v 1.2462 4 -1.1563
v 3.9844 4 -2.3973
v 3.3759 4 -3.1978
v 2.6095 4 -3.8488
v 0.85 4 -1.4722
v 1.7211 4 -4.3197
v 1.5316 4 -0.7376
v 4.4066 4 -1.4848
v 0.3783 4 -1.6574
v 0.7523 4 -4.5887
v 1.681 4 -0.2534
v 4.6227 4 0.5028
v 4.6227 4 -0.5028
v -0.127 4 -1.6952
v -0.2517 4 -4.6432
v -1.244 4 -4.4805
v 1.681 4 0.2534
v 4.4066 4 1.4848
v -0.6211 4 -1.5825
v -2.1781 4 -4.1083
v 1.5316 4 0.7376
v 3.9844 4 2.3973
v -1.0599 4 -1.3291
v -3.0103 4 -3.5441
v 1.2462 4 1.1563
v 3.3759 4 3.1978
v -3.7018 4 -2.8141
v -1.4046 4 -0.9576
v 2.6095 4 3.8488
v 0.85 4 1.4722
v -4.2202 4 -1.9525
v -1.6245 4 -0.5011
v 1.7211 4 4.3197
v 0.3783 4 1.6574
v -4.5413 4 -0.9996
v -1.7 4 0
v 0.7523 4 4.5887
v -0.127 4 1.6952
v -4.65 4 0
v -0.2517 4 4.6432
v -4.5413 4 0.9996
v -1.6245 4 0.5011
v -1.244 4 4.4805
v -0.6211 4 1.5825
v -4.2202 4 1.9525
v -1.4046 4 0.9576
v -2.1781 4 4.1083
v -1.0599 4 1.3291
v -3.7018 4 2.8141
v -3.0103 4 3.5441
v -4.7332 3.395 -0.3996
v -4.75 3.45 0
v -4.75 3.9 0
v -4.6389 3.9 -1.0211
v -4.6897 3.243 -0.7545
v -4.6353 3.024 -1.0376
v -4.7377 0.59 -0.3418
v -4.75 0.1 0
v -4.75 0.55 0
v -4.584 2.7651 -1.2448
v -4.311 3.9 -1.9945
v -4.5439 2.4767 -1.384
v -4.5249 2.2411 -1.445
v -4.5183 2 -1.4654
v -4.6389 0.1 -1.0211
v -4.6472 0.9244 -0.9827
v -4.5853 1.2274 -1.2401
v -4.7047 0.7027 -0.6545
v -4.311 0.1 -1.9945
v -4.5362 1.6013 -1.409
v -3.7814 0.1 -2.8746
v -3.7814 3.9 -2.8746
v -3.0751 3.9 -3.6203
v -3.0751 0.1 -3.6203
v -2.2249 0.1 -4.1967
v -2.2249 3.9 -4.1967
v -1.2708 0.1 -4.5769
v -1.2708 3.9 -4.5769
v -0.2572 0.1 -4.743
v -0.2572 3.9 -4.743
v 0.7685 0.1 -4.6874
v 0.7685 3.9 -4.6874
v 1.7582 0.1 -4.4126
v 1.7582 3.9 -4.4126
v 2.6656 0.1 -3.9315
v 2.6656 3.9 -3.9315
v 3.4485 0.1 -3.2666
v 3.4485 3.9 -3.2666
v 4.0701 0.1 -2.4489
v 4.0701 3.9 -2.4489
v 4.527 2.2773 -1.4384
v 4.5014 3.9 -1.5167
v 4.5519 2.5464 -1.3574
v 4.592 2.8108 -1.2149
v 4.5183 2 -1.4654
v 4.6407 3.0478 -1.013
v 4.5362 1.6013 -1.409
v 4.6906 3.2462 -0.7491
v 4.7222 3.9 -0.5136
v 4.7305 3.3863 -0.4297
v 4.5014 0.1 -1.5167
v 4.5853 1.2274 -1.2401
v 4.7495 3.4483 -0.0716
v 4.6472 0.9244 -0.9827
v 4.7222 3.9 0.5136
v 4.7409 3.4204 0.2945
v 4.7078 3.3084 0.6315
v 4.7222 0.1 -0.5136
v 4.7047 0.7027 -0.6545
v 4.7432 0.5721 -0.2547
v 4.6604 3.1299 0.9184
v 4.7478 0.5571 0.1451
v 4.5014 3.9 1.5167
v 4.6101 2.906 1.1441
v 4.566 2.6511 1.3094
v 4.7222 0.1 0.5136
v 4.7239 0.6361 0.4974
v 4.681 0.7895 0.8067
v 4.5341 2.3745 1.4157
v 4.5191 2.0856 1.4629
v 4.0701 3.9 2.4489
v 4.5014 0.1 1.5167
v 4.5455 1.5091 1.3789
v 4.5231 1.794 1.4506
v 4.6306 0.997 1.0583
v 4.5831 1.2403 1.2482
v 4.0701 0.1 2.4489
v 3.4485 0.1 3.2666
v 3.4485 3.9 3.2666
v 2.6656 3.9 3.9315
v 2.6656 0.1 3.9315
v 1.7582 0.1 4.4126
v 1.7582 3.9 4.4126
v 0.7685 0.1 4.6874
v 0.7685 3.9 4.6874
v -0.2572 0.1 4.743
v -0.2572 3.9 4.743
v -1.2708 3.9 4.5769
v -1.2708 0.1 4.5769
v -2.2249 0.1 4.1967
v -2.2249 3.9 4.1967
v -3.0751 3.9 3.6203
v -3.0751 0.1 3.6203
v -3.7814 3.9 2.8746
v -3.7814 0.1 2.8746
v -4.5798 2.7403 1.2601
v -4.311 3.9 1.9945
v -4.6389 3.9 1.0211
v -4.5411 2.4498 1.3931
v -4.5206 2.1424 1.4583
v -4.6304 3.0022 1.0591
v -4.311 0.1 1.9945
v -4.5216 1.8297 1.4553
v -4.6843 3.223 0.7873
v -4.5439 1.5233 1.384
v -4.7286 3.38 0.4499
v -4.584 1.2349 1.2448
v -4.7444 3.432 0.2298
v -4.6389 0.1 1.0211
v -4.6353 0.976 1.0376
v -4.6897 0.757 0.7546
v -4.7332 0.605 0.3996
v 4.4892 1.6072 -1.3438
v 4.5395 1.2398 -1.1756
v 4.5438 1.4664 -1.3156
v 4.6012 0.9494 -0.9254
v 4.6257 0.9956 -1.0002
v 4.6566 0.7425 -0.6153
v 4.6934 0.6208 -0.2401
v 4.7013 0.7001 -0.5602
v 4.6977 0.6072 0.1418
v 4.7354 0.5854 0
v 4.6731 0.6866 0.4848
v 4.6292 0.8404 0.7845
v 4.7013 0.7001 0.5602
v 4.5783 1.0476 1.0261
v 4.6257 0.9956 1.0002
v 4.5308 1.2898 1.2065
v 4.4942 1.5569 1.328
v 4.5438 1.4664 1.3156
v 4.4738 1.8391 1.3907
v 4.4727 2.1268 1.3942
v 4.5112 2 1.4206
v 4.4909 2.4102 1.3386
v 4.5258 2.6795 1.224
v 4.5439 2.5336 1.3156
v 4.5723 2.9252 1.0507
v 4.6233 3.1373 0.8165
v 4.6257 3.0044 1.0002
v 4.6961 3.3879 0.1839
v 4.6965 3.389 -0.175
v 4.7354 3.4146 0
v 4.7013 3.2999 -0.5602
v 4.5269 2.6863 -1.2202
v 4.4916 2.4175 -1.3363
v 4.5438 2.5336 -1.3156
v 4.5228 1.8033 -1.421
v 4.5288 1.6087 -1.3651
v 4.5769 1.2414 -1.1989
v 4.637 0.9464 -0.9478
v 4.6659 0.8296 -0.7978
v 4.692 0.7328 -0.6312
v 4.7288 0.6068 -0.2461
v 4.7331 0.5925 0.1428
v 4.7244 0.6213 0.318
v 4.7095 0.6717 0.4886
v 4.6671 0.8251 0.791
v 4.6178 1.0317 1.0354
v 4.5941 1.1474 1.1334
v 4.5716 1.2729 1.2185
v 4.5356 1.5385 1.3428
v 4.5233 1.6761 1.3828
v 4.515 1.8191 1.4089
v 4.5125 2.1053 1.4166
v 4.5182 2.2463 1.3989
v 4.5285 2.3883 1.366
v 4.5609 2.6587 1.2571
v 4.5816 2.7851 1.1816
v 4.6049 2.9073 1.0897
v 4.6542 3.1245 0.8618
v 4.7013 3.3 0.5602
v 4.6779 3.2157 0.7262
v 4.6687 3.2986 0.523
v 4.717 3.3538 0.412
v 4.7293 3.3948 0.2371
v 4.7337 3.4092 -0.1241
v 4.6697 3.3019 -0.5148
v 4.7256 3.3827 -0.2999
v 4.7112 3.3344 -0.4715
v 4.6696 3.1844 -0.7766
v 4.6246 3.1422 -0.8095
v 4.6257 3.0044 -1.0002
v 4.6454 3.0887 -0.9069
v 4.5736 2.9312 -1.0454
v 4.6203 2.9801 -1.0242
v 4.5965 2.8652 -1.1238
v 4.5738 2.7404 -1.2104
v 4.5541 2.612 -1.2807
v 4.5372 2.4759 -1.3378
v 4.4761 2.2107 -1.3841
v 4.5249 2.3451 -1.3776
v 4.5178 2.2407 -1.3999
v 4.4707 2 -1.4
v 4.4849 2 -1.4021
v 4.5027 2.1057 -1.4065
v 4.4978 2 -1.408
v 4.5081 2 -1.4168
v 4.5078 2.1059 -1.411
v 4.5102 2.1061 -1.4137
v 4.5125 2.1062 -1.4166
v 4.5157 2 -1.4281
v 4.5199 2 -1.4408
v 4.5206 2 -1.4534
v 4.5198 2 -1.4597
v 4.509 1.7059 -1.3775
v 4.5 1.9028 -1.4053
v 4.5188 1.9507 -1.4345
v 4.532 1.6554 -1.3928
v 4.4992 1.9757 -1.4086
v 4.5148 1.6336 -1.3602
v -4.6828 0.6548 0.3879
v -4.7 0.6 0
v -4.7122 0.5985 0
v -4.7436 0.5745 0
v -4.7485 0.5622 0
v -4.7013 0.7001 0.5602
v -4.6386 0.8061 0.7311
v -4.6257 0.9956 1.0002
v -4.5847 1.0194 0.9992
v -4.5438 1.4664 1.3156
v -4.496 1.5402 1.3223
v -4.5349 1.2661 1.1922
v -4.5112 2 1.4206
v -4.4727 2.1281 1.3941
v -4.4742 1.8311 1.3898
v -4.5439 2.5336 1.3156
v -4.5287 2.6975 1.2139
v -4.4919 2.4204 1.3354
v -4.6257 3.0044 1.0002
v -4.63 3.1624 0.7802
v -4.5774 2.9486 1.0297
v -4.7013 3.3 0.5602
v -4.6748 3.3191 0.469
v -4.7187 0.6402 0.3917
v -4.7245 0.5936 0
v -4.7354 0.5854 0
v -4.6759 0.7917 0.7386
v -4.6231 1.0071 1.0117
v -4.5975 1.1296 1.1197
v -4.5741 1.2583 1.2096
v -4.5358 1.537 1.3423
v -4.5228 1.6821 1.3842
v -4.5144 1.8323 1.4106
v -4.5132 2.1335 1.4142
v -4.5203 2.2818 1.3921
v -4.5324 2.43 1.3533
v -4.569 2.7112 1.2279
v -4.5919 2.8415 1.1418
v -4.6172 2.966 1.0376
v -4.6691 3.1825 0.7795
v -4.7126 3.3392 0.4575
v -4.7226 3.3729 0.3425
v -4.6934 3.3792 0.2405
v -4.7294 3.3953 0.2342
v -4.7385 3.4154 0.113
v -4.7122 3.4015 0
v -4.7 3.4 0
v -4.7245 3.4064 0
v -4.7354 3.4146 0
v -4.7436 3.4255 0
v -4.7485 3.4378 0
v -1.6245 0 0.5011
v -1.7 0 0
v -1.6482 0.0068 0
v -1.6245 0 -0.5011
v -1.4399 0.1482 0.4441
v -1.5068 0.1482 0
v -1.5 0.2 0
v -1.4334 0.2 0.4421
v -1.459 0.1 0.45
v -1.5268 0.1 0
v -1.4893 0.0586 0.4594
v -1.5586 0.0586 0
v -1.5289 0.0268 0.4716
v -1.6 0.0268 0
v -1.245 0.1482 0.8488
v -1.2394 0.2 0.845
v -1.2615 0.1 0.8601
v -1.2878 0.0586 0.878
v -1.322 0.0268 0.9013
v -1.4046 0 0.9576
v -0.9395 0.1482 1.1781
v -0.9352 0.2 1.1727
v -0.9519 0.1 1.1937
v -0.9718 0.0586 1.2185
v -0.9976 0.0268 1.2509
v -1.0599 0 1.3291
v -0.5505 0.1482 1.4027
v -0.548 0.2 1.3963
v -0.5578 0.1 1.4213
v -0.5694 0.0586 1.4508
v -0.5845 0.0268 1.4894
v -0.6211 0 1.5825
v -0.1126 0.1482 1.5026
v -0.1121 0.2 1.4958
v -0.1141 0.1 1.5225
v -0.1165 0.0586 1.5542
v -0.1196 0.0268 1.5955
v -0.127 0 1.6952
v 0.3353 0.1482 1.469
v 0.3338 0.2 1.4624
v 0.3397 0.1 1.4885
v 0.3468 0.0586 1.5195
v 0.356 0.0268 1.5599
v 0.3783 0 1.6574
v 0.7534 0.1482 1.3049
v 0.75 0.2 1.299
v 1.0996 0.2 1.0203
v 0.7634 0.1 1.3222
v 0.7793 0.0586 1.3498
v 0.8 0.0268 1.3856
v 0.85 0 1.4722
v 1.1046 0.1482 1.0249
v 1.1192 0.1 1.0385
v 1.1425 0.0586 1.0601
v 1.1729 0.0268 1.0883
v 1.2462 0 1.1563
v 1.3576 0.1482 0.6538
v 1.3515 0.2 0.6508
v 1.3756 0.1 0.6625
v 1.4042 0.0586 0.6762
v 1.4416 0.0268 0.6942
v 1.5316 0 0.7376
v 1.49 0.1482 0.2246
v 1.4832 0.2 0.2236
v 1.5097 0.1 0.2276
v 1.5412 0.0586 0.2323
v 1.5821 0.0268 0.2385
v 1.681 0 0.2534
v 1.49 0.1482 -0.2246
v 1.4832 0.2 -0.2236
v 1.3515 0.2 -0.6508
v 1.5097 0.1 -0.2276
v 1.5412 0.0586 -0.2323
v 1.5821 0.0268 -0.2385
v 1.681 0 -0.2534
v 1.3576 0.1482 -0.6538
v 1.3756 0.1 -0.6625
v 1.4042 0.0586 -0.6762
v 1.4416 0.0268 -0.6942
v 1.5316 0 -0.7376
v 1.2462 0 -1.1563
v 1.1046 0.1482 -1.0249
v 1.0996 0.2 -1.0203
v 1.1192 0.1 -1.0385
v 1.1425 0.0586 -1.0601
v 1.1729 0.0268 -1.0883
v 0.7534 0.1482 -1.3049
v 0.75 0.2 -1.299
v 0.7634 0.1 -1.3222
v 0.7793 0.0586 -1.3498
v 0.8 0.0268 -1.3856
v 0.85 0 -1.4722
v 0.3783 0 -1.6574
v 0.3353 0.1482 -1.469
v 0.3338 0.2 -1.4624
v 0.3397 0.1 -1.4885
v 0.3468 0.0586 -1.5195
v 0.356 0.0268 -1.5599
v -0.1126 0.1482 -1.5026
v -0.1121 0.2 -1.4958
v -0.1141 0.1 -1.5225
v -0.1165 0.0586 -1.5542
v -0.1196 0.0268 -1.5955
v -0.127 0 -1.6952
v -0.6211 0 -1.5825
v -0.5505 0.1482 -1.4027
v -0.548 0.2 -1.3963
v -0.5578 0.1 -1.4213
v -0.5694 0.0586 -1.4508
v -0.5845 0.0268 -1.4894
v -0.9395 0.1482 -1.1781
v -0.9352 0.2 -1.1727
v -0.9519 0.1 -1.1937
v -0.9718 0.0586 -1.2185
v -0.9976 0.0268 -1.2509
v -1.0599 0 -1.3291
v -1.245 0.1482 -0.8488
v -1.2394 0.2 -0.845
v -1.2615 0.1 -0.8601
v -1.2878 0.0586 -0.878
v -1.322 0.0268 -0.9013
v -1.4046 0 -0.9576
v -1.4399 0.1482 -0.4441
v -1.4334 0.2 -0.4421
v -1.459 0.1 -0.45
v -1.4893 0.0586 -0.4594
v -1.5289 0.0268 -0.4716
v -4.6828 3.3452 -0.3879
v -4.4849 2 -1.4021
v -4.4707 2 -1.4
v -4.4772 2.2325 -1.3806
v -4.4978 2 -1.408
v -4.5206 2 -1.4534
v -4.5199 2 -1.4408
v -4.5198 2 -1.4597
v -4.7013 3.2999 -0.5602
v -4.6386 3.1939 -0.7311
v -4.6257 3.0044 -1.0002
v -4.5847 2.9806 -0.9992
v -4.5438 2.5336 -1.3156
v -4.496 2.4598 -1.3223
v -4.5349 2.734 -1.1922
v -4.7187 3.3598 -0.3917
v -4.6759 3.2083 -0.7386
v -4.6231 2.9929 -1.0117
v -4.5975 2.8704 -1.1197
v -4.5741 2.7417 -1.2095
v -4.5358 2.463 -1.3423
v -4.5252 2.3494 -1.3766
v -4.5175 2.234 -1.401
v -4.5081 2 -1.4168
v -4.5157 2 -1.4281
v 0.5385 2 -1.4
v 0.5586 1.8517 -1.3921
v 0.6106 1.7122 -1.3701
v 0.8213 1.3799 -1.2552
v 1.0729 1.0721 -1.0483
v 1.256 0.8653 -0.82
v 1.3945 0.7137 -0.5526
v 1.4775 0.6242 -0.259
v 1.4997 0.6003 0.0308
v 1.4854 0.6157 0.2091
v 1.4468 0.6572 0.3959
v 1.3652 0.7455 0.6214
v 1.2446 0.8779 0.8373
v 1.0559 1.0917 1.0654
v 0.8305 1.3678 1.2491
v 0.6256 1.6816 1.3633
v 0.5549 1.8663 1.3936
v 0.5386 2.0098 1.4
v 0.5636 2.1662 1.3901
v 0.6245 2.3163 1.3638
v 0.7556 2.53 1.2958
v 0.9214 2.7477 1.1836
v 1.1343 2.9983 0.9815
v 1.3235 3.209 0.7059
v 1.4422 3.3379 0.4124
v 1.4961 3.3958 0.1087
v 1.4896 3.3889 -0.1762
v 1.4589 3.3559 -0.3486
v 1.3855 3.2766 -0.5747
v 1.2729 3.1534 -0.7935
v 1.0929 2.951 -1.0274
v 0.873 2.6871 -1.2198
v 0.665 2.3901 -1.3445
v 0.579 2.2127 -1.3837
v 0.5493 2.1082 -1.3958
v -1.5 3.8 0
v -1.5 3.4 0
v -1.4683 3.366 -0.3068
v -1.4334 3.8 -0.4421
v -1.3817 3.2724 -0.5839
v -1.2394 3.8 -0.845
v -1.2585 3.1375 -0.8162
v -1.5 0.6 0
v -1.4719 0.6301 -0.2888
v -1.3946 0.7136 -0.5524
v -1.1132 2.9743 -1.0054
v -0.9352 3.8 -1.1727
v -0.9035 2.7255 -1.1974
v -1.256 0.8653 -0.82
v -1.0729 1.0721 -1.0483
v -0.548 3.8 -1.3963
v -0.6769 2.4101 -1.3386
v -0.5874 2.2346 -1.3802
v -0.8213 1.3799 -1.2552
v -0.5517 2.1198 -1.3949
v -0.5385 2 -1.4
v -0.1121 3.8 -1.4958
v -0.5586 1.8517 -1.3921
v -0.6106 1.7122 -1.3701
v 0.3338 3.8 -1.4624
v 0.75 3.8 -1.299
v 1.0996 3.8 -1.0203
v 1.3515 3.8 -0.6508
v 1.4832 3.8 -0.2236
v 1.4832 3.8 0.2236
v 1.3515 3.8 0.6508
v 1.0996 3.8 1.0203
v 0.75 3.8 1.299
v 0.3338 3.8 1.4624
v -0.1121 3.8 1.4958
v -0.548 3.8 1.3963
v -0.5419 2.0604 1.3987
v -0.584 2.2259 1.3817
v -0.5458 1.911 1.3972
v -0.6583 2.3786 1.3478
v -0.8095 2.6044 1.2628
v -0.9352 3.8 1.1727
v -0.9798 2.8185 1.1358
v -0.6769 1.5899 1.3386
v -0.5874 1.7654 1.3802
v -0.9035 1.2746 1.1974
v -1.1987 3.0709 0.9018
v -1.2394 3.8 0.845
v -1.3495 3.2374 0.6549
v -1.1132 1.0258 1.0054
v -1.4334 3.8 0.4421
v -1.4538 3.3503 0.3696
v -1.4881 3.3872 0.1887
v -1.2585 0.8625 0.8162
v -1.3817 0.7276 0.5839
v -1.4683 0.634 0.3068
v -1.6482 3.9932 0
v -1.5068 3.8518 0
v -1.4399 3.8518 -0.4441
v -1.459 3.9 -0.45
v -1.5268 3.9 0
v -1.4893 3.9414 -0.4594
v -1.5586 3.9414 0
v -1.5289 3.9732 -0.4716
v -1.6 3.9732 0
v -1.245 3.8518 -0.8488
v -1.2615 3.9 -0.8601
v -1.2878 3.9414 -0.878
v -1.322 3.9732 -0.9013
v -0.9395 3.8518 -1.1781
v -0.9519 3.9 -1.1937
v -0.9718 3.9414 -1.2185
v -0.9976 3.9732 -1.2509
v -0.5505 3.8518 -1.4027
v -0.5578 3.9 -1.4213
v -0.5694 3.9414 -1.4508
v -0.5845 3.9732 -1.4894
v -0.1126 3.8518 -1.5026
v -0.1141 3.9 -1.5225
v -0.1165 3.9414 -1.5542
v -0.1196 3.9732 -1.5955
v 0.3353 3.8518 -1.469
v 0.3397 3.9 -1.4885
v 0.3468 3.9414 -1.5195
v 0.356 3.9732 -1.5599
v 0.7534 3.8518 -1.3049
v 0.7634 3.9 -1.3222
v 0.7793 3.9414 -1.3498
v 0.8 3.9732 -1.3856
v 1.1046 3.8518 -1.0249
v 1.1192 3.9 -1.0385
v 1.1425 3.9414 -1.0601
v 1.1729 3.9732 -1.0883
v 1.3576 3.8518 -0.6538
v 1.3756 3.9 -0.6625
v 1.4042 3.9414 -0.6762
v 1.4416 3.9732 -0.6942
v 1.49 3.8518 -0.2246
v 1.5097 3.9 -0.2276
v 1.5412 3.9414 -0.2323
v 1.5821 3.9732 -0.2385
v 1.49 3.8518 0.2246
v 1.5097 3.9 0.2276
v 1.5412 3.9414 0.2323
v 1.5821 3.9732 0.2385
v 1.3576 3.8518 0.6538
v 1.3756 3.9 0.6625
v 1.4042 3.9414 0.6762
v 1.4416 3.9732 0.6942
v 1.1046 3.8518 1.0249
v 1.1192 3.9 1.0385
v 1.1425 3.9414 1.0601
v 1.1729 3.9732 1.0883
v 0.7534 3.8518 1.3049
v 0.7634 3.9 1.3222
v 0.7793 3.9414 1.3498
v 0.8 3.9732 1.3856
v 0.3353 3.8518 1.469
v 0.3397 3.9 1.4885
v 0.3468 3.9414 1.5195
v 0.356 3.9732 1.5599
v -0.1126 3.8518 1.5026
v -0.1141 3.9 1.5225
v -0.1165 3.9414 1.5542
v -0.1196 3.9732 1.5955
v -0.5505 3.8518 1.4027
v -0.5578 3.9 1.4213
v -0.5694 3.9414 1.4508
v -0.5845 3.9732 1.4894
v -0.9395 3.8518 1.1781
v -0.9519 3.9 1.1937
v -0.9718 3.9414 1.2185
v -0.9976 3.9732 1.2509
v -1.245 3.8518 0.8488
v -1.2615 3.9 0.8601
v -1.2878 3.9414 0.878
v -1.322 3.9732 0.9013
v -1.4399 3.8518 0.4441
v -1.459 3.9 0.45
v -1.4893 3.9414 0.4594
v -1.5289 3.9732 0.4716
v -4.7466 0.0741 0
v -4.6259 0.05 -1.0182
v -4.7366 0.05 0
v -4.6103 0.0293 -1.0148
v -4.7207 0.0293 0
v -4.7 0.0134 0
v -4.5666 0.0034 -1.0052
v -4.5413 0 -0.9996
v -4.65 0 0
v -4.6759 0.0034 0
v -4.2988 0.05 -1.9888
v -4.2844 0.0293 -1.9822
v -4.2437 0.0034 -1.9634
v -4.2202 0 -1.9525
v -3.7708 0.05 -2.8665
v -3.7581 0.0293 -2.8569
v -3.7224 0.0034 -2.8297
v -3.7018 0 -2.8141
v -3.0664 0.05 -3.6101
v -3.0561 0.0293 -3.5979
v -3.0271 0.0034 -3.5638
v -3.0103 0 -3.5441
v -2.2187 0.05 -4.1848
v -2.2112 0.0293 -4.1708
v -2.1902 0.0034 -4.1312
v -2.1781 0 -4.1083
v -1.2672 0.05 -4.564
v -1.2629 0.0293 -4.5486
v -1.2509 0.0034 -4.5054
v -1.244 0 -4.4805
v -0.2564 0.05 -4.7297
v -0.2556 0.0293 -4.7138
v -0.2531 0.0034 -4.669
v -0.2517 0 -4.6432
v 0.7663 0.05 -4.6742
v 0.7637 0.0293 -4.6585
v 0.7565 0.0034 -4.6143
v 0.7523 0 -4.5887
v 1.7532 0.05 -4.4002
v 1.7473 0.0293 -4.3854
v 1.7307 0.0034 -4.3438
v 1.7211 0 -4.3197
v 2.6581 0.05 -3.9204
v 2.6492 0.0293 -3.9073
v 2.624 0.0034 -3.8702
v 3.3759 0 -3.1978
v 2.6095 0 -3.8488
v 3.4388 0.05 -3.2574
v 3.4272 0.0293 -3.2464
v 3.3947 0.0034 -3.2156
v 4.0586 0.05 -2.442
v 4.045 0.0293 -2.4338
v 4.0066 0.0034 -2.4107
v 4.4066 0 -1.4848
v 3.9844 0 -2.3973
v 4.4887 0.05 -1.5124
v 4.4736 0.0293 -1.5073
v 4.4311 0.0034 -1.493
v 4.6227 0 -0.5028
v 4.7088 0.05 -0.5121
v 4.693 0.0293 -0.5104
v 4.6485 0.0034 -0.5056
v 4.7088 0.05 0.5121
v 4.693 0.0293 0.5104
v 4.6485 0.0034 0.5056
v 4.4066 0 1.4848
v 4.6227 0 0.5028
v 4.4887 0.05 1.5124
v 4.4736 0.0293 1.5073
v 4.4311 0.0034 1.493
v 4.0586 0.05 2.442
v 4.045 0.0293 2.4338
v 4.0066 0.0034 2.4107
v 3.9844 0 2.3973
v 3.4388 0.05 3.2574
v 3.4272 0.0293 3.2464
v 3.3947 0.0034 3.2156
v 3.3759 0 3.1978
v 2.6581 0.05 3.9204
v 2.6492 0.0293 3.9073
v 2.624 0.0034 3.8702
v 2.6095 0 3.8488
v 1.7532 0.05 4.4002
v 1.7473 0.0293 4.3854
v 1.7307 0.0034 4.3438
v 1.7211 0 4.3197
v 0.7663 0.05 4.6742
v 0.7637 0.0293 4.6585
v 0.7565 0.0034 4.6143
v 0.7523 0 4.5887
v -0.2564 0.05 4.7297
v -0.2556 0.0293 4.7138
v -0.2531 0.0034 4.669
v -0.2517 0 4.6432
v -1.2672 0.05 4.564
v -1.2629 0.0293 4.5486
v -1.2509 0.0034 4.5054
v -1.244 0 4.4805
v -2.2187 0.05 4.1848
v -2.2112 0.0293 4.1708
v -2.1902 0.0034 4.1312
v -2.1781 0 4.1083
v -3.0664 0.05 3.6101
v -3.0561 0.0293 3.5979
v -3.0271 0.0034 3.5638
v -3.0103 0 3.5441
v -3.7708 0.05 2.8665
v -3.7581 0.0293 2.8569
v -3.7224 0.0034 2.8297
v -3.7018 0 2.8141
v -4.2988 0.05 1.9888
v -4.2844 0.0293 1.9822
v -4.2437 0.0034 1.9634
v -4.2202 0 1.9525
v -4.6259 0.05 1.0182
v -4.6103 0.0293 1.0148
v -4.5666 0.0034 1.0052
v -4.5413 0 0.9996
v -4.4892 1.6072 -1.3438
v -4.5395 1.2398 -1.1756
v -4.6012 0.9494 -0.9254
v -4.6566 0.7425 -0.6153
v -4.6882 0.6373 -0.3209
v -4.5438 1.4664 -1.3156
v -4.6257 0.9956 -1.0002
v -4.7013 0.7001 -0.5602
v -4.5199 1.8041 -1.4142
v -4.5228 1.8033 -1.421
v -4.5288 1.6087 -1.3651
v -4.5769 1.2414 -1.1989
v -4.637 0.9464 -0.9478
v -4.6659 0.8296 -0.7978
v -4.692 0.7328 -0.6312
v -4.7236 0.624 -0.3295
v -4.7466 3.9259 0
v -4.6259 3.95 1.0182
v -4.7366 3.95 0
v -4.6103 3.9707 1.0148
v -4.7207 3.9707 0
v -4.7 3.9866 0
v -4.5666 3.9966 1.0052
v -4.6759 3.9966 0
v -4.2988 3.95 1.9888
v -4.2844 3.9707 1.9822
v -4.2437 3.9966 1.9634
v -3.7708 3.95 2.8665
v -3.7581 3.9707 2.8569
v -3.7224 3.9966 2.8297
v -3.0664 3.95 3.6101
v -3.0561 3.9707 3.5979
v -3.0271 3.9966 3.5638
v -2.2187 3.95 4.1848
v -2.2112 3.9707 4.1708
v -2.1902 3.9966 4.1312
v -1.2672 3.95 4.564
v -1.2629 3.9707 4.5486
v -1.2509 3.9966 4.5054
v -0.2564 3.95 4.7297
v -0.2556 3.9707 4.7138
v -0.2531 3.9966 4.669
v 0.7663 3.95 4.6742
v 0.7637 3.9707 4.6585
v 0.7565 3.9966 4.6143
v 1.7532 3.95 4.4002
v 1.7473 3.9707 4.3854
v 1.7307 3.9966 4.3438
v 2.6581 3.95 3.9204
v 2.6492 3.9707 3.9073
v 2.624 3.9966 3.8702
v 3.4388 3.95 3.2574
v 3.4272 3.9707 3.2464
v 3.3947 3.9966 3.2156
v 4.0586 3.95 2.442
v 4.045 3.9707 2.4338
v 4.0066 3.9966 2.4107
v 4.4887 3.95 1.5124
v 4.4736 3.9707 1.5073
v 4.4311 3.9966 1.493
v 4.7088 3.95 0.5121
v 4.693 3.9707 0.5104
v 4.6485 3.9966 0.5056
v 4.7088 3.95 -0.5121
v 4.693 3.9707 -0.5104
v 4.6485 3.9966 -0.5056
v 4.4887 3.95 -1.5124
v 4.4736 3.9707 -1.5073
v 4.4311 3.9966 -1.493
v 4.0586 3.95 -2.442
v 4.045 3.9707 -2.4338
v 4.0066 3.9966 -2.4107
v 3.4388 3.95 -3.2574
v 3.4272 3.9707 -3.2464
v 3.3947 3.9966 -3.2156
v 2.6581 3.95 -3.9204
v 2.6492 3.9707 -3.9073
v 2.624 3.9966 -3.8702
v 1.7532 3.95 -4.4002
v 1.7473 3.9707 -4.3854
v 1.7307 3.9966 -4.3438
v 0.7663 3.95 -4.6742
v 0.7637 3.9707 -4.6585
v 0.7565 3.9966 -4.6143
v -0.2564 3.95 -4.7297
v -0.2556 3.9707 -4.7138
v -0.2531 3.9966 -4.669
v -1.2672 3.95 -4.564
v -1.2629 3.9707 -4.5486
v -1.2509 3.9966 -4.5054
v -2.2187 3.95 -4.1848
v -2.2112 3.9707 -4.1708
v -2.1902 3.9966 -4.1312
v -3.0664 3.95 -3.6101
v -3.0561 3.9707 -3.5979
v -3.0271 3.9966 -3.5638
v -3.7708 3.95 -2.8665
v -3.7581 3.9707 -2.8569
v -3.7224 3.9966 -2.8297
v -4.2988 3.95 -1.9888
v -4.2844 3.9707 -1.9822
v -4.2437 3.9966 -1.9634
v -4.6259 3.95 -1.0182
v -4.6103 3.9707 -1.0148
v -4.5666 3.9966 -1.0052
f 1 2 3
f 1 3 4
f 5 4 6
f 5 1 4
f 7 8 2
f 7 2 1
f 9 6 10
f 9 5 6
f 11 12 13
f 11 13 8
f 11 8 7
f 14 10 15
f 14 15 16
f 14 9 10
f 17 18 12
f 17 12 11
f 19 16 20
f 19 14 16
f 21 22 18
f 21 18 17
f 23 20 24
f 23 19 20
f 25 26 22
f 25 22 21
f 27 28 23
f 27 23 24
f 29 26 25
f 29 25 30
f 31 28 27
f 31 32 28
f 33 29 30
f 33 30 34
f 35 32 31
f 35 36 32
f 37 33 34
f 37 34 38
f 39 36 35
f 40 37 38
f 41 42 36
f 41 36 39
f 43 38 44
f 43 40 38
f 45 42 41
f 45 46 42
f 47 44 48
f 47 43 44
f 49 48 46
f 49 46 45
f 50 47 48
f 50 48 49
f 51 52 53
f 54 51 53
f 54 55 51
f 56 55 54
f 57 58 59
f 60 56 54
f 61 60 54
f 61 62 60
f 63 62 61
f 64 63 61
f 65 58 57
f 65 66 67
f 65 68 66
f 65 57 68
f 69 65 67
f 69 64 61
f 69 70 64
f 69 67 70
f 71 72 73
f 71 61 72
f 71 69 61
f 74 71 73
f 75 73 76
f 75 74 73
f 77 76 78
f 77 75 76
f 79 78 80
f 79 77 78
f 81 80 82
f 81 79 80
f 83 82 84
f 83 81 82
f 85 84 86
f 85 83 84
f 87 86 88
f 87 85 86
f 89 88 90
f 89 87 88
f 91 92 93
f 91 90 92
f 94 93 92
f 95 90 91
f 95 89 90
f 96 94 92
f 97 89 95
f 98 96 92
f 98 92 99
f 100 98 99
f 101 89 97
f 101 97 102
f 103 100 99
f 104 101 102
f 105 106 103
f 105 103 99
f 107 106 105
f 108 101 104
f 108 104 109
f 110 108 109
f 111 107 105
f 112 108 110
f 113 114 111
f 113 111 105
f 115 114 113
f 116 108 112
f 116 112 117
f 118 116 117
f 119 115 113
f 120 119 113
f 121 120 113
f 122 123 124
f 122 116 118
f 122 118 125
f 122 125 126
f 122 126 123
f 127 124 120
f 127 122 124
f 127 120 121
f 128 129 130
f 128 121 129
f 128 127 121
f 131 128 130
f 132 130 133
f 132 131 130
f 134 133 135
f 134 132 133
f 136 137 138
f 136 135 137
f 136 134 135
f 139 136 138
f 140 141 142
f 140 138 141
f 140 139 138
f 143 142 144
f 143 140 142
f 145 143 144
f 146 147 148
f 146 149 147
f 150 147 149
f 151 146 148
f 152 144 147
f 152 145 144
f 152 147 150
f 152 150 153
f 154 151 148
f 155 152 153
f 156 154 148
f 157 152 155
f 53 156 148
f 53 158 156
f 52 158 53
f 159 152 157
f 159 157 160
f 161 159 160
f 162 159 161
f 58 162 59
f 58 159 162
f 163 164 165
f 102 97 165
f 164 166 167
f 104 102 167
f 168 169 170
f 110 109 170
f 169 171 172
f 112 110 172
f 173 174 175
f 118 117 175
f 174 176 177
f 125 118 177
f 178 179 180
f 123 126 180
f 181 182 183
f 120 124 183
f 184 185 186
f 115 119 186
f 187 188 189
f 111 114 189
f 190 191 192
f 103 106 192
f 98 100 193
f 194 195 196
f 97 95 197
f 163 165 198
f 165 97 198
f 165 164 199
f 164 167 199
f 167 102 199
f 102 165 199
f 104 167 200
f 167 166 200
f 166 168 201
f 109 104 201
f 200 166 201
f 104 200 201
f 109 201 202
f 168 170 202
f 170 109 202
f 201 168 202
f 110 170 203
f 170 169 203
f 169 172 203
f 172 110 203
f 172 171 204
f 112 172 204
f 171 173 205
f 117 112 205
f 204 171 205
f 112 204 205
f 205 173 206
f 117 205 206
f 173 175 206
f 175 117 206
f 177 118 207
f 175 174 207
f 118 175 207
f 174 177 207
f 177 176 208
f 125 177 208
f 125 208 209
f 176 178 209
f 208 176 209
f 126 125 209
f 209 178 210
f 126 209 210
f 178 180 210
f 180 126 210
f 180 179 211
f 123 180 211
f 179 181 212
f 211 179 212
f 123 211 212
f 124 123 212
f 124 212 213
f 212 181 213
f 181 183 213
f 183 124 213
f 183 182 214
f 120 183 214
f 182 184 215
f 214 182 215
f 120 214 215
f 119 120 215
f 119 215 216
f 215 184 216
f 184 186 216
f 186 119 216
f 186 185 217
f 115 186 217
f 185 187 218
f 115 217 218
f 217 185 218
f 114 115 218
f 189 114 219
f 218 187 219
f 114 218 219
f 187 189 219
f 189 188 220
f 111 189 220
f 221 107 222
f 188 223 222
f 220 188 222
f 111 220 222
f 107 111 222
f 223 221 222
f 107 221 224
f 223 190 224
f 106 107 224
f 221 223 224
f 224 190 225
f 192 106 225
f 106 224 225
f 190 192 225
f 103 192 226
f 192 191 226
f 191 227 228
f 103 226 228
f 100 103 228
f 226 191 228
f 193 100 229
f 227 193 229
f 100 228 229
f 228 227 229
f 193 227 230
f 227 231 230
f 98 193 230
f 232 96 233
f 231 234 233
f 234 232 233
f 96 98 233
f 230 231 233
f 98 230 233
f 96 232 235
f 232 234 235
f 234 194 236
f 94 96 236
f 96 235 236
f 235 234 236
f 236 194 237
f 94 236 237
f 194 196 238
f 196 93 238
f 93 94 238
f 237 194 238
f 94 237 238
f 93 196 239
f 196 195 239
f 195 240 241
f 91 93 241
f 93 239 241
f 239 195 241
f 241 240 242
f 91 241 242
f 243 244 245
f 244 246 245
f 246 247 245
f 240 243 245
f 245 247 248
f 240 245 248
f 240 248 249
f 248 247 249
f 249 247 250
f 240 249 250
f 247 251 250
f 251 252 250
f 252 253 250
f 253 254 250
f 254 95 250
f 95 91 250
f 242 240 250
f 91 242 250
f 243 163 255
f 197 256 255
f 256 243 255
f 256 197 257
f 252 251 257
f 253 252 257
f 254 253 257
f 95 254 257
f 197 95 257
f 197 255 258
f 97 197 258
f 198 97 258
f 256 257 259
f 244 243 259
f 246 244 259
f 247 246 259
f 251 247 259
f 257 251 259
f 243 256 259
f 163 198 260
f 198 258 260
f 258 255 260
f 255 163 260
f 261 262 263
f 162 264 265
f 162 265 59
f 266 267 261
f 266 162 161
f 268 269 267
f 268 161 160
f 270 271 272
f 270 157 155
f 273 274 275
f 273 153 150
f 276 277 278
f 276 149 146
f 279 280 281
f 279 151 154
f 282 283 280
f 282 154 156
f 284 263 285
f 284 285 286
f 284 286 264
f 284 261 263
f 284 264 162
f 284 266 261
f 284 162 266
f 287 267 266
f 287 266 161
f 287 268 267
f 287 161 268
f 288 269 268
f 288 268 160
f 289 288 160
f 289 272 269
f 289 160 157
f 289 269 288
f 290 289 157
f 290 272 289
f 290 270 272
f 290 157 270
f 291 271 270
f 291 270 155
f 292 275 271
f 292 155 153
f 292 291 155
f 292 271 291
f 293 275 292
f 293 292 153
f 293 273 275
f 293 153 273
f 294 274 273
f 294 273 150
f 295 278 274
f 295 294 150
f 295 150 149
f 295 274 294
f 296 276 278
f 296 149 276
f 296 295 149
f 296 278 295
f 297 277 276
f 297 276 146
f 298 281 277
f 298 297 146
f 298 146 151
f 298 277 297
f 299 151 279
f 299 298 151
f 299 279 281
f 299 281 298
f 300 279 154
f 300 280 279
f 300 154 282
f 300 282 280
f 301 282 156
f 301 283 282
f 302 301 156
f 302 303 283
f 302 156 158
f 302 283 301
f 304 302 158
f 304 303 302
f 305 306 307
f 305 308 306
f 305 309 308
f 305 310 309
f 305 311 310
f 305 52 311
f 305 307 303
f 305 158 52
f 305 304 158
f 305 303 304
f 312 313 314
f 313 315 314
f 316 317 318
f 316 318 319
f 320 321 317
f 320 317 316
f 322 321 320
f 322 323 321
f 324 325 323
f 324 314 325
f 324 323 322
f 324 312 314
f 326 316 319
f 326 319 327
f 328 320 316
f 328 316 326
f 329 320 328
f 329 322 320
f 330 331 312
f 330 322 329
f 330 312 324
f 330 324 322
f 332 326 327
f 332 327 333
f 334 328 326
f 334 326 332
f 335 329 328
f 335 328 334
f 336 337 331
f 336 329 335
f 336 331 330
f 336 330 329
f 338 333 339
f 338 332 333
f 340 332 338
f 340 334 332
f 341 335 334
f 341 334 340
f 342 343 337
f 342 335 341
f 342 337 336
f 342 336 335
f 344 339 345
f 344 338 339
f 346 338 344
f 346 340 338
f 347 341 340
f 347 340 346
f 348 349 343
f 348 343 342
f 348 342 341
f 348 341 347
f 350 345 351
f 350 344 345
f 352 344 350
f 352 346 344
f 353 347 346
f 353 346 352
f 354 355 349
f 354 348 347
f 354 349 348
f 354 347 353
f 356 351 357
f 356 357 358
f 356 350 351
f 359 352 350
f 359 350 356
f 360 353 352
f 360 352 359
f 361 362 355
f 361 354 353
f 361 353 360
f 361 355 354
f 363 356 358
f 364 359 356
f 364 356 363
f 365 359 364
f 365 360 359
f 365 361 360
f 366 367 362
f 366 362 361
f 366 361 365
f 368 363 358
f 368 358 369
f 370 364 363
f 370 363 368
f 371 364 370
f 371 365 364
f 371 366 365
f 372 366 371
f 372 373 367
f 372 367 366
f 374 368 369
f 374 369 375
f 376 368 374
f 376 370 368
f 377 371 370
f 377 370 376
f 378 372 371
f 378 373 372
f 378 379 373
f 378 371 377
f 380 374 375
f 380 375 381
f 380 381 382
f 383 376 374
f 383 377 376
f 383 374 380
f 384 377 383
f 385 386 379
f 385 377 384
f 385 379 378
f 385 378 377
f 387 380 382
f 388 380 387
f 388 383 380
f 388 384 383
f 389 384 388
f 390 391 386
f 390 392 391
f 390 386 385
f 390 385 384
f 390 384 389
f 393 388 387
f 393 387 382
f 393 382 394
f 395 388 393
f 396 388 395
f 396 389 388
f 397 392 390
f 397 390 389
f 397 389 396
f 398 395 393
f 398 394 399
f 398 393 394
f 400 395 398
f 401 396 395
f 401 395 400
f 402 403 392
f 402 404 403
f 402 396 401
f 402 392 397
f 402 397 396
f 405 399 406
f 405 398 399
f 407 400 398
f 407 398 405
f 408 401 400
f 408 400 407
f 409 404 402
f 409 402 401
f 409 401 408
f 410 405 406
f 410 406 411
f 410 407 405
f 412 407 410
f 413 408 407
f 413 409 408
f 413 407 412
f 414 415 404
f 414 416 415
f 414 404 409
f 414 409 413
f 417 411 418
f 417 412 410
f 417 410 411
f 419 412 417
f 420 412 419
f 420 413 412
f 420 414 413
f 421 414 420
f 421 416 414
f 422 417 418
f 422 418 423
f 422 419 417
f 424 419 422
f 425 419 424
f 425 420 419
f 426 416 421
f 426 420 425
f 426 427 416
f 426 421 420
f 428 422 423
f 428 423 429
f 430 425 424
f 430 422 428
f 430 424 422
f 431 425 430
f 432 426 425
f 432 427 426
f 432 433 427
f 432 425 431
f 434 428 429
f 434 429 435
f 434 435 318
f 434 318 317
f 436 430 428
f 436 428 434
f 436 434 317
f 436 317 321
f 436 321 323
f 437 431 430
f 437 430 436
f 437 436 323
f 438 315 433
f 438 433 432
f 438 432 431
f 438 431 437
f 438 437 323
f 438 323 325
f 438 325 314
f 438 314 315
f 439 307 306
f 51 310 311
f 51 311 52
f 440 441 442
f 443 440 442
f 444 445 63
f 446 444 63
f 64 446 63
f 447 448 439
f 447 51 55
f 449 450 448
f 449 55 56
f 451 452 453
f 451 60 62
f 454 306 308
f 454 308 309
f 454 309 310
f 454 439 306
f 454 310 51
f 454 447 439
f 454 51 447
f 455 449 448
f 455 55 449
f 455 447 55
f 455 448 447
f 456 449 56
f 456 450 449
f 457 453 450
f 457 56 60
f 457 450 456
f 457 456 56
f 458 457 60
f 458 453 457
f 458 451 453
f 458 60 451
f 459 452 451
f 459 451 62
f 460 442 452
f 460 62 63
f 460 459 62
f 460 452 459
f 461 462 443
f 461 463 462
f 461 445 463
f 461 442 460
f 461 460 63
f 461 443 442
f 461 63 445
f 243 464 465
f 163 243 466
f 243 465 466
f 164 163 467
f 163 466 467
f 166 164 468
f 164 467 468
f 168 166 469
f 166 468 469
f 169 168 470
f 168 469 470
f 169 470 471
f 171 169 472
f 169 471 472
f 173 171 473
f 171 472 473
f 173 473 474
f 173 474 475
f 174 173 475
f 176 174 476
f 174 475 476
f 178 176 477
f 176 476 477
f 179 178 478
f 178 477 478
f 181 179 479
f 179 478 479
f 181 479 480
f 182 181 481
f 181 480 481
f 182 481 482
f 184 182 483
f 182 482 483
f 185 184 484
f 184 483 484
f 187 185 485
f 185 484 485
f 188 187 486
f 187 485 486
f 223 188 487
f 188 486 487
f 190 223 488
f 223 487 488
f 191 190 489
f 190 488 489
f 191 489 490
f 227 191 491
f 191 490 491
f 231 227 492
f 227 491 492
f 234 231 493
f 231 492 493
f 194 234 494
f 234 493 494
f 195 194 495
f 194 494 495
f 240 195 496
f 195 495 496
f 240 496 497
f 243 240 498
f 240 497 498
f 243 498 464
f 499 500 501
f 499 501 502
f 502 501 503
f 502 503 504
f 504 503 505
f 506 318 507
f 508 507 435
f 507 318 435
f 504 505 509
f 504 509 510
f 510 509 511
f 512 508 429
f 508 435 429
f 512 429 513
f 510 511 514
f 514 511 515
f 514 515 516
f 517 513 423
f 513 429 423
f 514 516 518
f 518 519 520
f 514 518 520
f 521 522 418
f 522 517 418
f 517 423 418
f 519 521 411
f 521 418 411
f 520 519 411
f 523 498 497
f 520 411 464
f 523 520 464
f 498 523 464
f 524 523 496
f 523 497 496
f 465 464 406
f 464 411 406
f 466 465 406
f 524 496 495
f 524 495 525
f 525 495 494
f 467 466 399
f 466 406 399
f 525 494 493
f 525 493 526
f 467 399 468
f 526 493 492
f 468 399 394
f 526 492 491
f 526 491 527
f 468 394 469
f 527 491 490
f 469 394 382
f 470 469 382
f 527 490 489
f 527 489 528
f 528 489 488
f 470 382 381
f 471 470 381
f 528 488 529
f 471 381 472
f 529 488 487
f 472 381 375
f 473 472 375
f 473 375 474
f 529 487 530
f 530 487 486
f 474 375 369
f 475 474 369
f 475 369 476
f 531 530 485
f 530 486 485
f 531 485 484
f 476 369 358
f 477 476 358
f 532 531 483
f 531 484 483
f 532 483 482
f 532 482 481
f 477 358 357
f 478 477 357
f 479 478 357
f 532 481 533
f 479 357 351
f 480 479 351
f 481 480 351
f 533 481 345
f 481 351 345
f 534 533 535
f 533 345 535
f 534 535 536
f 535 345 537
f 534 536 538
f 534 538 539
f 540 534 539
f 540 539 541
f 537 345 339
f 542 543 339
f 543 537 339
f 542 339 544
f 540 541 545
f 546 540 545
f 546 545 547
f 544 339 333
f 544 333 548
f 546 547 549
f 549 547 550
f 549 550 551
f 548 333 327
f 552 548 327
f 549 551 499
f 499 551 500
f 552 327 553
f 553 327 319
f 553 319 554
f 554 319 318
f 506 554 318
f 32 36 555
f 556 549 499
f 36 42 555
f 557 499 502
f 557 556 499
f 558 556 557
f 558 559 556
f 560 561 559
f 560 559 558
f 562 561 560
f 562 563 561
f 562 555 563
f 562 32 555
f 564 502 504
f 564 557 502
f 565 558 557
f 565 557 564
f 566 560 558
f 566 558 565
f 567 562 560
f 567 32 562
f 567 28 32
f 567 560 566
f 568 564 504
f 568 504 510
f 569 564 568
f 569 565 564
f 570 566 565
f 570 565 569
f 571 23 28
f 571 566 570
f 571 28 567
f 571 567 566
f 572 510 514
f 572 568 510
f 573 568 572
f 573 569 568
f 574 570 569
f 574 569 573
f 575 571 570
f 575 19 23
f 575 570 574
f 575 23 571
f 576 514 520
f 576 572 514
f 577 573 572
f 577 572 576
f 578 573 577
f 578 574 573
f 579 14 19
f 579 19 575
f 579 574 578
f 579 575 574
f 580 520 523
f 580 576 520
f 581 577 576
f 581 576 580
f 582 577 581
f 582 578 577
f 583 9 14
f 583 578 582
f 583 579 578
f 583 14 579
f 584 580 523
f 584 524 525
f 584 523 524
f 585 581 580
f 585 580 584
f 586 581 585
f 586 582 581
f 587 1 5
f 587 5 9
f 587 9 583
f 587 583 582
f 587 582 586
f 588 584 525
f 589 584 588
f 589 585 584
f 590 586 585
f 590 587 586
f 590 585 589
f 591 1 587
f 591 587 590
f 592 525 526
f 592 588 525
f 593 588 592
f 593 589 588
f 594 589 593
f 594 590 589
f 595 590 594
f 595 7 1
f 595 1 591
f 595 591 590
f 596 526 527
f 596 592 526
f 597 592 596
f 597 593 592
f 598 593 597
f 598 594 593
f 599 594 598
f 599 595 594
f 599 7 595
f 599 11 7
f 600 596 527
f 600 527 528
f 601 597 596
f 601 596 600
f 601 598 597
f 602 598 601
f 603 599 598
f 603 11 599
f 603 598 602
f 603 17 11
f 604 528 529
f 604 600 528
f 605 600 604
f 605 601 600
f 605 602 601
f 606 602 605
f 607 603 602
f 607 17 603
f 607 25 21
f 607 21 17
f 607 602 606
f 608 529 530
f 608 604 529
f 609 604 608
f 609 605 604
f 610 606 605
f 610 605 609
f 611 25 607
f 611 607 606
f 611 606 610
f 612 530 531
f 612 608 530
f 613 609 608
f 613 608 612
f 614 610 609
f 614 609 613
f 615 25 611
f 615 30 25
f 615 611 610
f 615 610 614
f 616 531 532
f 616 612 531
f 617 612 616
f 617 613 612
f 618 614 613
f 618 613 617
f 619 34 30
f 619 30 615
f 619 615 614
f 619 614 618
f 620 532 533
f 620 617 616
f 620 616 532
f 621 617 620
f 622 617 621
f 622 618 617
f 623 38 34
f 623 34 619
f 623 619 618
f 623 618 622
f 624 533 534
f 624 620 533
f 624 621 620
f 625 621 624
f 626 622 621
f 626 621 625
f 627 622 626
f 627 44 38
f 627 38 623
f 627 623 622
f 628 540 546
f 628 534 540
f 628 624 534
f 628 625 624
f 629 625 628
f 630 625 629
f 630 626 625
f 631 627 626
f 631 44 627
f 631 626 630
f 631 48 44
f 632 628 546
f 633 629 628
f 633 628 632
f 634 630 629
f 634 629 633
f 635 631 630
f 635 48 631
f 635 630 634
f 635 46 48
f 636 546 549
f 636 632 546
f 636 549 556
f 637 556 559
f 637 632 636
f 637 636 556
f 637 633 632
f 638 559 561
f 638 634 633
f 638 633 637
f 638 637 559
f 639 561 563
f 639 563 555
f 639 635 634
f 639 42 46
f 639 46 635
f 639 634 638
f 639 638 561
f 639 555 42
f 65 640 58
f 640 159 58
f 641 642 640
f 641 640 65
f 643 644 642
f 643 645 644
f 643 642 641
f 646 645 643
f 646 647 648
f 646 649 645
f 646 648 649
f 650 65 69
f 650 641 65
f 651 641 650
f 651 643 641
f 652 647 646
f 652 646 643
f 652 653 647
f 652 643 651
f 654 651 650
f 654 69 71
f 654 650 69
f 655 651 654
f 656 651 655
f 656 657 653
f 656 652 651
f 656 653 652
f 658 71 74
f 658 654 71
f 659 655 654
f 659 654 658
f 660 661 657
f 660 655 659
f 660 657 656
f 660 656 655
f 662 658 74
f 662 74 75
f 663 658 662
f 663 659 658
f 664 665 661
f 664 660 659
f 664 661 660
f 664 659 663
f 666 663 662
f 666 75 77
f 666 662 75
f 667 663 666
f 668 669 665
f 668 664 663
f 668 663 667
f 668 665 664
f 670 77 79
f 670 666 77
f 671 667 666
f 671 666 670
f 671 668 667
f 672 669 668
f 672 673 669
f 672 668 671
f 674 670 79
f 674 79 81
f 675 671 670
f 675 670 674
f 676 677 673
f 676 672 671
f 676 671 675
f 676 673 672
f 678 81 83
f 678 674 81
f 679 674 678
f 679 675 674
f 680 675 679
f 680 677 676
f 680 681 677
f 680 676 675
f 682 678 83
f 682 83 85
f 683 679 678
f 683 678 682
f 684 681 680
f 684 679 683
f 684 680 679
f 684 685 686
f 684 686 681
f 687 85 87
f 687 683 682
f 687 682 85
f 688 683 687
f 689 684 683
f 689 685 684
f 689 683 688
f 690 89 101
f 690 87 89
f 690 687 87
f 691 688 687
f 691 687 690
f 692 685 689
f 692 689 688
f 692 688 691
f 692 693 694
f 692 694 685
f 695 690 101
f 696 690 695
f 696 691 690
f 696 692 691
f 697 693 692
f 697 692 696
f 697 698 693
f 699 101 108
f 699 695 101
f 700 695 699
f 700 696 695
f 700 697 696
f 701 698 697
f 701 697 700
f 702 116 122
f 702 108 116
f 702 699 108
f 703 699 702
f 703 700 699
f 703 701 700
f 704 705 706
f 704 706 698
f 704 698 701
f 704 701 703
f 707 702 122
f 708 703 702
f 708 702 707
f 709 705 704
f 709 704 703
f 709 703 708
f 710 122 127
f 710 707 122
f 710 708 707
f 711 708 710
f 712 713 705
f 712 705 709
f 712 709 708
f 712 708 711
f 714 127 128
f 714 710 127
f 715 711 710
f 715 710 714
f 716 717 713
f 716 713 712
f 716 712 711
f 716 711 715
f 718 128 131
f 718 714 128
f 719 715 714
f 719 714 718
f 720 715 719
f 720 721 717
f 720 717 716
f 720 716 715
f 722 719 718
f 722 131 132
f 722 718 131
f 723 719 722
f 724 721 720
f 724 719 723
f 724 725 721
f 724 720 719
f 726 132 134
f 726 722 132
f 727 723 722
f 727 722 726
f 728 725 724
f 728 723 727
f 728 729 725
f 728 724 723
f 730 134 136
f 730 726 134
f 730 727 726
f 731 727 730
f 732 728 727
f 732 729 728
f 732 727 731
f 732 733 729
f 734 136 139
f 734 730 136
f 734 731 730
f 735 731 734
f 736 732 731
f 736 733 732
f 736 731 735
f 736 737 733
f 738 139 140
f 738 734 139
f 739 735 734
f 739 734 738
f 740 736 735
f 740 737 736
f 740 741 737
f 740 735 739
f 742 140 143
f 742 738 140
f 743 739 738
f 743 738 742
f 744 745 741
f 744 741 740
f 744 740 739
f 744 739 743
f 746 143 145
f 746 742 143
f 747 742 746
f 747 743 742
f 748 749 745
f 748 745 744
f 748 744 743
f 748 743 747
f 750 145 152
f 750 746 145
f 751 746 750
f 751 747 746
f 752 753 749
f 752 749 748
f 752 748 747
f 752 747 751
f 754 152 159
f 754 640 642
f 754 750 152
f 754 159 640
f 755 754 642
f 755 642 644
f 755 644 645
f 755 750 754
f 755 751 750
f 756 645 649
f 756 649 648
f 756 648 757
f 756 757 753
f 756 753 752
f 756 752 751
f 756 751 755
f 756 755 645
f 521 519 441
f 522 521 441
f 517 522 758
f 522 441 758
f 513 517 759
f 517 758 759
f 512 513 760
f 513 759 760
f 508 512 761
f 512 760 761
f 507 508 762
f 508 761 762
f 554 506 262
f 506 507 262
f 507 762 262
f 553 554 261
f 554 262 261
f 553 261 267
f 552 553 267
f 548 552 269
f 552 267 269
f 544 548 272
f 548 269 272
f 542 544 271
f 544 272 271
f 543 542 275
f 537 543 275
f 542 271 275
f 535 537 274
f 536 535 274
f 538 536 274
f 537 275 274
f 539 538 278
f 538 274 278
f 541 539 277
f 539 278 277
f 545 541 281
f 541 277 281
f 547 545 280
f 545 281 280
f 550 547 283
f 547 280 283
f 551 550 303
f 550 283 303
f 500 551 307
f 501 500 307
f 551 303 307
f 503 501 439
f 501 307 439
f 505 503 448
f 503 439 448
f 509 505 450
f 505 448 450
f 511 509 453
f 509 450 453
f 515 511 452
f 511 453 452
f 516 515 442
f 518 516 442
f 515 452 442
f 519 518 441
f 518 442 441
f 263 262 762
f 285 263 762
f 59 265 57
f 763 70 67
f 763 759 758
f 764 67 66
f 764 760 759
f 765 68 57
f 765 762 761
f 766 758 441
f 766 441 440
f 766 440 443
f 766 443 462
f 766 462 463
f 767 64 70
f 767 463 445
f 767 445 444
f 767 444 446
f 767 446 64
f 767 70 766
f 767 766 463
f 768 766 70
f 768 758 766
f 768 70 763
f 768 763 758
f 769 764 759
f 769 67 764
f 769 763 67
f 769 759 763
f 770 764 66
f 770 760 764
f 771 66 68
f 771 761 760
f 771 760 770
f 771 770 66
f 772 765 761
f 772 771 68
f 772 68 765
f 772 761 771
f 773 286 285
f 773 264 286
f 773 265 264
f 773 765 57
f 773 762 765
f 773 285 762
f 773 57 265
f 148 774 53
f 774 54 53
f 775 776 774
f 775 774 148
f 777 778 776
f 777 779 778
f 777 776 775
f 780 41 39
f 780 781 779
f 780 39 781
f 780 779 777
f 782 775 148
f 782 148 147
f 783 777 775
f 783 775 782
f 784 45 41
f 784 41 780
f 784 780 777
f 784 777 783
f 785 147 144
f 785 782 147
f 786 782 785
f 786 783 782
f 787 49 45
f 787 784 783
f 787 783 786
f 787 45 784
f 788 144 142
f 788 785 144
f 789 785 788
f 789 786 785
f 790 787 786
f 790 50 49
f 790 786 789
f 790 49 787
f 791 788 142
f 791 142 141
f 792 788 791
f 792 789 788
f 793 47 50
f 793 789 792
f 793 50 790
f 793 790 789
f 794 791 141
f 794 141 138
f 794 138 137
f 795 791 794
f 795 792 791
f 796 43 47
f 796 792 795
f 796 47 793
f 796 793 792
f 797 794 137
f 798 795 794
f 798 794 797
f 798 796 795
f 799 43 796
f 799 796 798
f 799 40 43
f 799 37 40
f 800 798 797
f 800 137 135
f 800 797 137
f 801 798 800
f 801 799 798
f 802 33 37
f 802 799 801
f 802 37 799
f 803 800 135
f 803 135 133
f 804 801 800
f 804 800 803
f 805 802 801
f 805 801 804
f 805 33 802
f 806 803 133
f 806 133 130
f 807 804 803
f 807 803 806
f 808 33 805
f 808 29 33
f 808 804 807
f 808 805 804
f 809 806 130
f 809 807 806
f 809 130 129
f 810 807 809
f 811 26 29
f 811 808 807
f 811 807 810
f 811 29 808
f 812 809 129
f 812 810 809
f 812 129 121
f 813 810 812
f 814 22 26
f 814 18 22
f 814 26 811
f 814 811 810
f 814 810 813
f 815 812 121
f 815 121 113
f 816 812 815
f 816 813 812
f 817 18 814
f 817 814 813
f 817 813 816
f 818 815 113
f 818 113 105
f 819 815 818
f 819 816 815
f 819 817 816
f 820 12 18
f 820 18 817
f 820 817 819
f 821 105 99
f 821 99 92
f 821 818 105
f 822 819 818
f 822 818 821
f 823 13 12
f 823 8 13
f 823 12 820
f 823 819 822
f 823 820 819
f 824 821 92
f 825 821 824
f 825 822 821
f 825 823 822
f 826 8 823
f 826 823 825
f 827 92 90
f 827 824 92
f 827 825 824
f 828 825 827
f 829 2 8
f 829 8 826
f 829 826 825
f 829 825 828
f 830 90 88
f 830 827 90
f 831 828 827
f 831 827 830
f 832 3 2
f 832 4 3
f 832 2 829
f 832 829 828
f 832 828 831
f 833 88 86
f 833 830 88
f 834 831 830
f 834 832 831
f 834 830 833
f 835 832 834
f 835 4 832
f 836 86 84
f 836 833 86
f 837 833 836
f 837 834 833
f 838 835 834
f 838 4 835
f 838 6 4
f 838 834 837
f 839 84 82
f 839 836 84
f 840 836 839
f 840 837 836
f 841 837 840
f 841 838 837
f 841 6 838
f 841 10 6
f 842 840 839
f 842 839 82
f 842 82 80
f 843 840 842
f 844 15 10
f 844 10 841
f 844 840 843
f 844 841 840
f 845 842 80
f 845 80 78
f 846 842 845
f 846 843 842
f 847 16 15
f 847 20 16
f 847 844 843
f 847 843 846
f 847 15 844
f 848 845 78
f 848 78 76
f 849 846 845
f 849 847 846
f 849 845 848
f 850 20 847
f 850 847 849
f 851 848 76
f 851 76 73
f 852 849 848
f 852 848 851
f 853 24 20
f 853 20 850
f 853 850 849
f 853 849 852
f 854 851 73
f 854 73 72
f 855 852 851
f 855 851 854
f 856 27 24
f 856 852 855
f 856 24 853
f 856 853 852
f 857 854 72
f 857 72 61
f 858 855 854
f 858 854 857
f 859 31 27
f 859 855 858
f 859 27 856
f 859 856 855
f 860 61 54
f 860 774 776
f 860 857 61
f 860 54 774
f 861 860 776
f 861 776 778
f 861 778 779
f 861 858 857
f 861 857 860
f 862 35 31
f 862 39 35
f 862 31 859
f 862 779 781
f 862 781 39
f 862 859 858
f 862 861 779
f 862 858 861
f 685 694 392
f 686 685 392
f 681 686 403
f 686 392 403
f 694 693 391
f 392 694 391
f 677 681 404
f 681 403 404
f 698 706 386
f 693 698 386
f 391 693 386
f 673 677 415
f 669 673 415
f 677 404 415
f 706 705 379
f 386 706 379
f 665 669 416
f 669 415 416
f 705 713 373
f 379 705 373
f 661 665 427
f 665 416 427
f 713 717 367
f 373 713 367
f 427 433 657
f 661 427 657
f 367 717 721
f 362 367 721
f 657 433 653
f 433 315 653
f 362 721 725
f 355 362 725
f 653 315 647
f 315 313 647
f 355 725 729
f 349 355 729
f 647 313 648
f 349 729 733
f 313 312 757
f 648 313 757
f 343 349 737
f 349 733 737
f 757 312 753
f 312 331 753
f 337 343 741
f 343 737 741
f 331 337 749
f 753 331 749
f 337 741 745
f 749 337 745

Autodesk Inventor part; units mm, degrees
ref_plane "XZ Plane" through (0, 0, 0) normal (0, 1, 0) x (-1, 0, 0)
ref_plane "XY Plane" through (0, 0, 0) normal (0, 0, 1) x (1, 0, 0)
sketch "Szkic1" plane through (0, 0, 0) normal (0, 1, 0) x (-1, 0, 0)
  circle A0 centre (0, 0) radius 4.75
  circle A1 centre (0, 0) radius 1.5
  dimension "d0" = 9.5
  dimension "d1" = 3
extrude "Wyciągnięcie proste1" add sketch "Szkic1" along normal blind 4
ref_plane "Płaszczyzna konstrukcyjna1" through (4.75, 0, 0) normal (1, 0, 0) x (0, 1, 0)
sketch "Szkic2" plane through (4.75, 0, 0) normal (1, 0, 0) x (0, 1, 0)
  line L0 (-0.6, 0) -> (3.6, 0) projected
  line L1 (4, -4.75) -> (4, 4.75) projected
  line L2 (0, 4.75) -> (0, -4.75) projected
  circle A0 centre (2, 0) radius 1.4
  line L3 (2, 0) -> (4, 0)
  line L4 (2, 0) -> (0, 0)
  dimension "d5" = 2.8
hole "Otwór1" at (4.75, 2, 0) direction (-1, 0, 0) diameter 2.8 end through all
thread "Gwint1" size "M3x0.5" class "6H" standard "ANSI Metric M Profile" full length
thread "Gwint2" size "M3x0.5" class "6H" standard "ANSI Metric M Profile" full length
fillet "Zaokrąglenie1" radius 0.1 2 edges at (4.75, 4, 0) (4.75, 0, 0)
fillet "Zaokrąglenie2" radius 0.2 1 edges at (1.5, 4, 0)
fillet "Zaokrąglenie3" radius 0.2 1 edges at (1.5, 0, 0)
fillet "Zaokrąglenie4" radius 0.05 6 edges at (-4.6327, 1.0728, -1.049) (-4.539, 1.9999, 1.4) (-4.6327, 2.9272, -1.0489) (4.6327, 1.0728, -1.049) (4.6327, 2.9272, -1.0489) (4.539, 1.9999, 1.4)
fillet_without_effect "Zaokrąglenie5"
equation "\"d6\" = d5"
equation "\"d4\" = 0.5 * d0"
properties part number "Smiglo-tuleja trzymajaca"
